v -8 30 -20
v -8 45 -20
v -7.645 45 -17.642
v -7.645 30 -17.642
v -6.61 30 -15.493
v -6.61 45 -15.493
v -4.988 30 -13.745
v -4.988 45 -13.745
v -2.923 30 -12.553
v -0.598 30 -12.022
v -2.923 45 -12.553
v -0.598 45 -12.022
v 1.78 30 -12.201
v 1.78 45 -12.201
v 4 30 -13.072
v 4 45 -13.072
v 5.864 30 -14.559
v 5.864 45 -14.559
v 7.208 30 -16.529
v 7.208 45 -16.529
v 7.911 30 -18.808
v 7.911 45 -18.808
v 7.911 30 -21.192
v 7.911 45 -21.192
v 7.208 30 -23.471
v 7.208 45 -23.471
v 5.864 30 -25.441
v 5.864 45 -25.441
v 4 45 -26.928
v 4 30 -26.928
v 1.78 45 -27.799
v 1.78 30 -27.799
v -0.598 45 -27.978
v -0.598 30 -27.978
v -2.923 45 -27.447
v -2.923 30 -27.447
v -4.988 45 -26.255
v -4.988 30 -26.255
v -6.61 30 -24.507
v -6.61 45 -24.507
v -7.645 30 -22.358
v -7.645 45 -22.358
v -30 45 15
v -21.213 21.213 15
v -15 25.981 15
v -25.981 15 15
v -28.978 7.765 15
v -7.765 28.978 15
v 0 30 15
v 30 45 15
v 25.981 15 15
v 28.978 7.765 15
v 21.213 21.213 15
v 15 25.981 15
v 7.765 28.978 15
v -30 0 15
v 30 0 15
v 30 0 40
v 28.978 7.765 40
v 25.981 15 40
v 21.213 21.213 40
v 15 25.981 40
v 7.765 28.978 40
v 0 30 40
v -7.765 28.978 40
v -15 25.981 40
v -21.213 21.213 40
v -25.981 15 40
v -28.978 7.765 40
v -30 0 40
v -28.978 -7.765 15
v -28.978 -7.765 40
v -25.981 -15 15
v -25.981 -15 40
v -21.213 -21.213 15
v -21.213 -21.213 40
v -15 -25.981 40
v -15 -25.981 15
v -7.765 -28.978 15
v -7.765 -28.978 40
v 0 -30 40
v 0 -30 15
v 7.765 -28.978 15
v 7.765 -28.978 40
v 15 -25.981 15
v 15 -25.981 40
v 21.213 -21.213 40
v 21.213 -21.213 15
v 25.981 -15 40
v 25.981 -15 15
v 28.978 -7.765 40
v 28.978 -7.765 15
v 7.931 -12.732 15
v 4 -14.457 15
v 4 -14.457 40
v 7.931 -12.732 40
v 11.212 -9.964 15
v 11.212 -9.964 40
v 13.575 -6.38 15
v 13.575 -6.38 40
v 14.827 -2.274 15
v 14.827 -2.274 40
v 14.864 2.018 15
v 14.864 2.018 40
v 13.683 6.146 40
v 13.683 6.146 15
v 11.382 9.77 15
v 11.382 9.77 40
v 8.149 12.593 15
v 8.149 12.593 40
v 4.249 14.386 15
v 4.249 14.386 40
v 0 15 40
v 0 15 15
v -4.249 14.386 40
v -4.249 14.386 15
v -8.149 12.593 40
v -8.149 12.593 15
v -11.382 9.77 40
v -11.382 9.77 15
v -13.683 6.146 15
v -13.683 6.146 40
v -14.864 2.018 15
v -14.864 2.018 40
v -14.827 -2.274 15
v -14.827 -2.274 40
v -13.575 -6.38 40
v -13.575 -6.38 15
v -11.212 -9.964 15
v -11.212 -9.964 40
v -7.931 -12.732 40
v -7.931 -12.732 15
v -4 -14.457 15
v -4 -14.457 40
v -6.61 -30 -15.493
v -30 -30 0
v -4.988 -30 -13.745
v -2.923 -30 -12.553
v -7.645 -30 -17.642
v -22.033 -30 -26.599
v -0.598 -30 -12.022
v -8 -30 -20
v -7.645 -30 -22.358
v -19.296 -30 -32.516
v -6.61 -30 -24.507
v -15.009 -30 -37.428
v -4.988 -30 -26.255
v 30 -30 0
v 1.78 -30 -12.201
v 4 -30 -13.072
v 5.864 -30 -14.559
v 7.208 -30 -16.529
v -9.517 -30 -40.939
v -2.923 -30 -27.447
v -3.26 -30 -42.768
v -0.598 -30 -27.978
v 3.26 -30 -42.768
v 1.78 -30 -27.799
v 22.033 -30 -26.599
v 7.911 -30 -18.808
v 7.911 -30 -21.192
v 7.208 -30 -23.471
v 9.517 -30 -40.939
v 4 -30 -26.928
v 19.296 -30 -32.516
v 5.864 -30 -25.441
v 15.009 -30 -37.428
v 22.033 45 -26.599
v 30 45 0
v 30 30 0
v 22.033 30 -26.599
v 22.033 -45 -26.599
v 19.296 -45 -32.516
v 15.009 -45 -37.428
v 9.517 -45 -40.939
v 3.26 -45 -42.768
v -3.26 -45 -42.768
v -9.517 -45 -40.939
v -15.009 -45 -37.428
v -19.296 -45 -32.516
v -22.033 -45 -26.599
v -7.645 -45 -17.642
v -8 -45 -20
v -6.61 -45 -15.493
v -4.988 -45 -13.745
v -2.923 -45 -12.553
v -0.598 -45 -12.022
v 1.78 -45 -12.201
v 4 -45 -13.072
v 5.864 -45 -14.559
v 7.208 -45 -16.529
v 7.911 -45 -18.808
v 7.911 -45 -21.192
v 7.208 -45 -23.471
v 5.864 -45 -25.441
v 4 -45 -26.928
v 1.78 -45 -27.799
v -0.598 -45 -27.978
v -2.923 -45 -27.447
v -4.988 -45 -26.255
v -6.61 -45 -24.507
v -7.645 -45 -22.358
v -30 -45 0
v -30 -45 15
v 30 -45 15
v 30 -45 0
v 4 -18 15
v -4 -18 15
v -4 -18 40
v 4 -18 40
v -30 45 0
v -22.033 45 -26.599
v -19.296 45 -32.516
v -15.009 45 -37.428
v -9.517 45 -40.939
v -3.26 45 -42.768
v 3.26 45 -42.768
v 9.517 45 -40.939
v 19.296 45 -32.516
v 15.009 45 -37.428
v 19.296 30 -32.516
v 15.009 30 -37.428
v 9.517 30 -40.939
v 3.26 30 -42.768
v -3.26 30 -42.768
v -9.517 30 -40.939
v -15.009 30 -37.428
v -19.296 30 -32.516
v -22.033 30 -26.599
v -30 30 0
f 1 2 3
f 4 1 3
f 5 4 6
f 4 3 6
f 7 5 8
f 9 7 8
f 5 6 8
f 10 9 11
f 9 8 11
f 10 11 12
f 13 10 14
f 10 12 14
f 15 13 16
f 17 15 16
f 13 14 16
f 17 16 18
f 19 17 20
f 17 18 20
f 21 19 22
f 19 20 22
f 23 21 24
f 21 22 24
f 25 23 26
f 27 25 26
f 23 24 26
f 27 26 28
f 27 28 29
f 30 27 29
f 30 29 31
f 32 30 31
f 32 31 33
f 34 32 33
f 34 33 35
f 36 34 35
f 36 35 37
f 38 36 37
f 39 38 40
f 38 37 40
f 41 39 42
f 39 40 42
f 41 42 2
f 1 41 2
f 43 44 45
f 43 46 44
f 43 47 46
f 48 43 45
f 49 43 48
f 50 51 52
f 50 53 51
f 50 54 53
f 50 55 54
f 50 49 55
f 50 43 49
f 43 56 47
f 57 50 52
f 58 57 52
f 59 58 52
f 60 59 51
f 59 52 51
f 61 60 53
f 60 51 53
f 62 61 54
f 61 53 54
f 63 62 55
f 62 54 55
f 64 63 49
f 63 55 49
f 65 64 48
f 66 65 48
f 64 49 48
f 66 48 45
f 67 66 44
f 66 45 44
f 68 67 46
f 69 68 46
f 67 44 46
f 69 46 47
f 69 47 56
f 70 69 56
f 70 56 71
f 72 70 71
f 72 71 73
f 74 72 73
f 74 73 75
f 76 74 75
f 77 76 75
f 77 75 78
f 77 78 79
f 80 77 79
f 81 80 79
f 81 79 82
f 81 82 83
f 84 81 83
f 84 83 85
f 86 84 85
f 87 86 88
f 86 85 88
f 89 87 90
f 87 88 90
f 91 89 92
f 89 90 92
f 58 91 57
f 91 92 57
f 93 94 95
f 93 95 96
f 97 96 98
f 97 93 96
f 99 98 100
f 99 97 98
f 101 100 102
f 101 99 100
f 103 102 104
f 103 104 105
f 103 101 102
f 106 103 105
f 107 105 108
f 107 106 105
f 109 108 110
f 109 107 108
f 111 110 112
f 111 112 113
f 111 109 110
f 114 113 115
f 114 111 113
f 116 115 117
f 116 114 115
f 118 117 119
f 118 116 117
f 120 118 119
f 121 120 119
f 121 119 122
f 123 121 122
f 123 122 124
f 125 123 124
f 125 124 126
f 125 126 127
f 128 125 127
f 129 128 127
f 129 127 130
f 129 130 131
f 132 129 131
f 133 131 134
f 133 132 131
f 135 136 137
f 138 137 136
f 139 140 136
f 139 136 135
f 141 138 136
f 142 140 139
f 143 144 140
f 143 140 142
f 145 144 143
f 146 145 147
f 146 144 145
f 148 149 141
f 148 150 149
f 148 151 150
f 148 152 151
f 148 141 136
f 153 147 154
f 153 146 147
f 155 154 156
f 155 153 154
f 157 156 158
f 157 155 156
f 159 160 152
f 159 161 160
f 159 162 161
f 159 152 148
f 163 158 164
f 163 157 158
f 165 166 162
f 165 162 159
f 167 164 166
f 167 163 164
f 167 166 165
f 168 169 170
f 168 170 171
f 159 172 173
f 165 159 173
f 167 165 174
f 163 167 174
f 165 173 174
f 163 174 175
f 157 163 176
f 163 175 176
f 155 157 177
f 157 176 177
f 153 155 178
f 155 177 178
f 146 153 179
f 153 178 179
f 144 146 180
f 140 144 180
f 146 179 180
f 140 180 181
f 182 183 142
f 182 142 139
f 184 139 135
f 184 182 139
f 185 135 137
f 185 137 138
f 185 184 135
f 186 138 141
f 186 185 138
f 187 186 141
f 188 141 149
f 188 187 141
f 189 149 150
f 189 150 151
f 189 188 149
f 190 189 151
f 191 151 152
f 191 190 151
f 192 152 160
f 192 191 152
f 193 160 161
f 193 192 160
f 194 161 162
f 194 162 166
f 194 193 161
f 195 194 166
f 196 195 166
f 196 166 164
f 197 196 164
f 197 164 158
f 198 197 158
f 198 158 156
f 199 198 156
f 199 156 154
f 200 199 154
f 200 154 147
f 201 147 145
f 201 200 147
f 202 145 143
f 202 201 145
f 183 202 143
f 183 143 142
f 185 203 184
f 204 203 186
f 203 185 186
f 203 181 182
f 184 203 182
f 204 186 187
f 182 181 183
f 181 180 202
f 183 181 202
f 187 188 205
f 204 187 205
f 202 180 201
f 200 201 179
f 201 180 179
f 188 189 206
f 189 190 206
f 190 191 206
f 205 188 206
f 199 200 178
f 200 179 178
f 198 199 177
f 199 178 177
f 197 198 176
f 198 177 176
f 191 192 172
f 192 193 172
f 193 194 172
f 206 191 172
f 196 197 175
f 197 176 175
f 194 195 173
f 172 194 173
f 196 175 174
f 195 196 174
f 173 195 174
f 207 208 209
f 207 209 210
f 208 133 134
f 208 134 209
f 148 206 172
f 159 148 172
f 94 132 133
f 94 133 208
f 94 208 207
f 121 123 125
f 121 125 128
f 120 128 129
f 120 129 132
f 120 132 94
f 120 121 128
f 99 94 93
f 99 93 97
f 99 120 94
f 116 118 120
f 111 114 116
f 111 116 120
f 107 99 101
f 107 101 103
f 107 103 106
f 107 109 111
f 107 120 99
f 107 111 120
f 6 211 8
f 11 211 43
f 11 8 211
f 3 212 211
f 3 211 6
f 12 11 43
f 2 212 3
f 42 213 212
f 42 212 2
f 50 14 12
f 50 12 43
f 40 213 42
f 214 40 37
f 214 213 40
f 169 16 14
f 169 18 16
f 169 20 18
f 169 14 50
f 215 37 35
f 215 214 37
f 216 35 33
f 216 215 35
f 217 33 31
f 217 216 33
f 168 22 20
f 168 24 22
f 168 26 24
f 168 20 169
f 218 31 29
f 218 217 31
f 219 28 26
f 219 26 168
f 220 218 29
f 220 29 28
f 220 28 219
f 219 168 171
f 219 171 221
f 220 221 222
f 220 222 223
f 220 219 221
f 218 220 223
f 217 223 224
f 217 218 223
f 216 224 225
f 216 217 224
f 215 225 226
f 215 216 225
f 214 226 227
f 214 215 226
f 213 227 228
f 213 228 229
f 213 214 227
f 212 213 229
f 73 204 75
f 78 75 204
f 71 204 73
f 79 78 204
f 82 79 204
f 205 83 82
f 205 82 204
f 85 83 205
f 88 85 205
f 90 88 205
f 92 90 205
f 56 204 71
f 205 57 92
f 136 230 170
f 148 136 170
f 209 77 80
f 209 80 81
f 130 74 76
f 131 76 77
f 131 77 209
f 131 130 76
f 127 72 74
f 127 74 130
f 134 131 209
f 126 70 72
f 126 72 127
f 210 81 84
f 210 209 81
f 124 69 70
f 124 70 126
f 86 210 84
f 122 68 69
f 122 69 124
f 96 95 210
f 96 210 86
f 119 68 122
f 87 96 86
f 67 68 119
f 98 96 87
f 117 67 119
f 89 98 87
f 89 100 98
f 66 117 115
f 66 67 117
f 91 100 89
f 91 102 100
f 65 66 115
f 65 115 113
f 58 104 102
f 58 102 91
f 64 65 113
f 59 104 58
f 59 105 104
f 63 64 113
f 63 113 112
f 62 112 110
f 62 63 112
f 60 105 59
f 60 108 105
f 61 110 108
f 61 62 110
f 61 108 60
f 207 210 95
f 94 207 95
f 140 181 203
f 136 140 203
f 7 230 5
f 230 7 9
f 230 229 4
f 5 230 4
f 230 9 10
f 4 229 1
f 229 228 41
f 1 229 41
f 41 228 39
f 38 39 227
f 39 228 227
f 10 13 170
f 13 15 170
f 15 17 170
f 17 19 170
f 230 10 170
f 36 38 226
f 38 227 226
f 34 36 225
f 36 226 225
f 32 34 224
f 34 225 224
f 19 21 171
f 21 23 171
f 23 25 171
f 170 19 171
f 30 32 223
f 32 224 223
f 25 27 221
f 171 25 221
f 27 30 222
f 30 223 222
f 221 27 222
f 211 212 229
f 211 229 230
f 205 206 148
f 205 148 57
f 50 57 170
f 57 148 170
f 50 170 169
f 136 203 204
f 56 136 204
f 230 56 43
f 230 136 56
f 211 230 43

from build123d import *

# Parameters (mm, degrees)
SKETCH1_W           = 60
SKETCH1_H           = 90
BOSS_EXTRUDE1_DEPTH = 15
SKETCH2_R           = 30
BOSS_EXTRUDE2_DEPTH = 25
SKETCH3_R           = 8
BOSS_EXTRUDE3_DEPTH = 15


with BuildPart() as part:
    # Sketch1 → Boss-Extrude1 (new body)
    with BuildSketch(Plane.XY):
        Rectangle(SKETCH1_W, SKETCH1_H)
    extrude(amount=BOSS_EXTRUDE1_DEPTH)

    # Sketch2 → Boss-Extrude2 (add)
    with BuildSketch(Plane.XY.offset(15)):
        Circle(SKETCH2_R)
        with BuildLine():
            Line((-4, -14.456832295), (-4, -18))
            Line((-4, -18), (4, -18))
            Line((4, -18), (4, -14.456832295))
            ThreePointArc((4, -14.456832295), (0, 15), (-4, -14.456832295))
        make_face(mode=Mode.SUBTRACT)
    extrude(amount=BOSS_EXTRUDE2_DEPTH)

    # Sketch3 → Boss-Extrude3 (add)
    with BuildSketch(Plane(origin=(0, 45, 0), x_dir=(1, 0, 0), z_dir=(0, 1, 0))):
        with BuildLine():
            Line((30, 0), (22.03289839, 26.599347585))
            ThreePointArc((22.03289839, 26.599347585), (0, 43), (-22.03289839, 26.599347585))
            Line((-22.03289839, 26.599347585), (-30, 0))
            Line((-30, 0), (30, 0))
        make_face()
        with Locations(Location((0, 20, 0), (0, 0, 180))):
            Circle(SKETCH3_R, mode=Mode.SUBTRACT)
    boss_extrude3 = extrude(amount=-BOSS_EXTRUDE3_DEPTH)

    # Mirror1: Boss-Extrude3 across plane
    add(boss_extrude3.mirror(Plane.ZX))


solid = part.part
